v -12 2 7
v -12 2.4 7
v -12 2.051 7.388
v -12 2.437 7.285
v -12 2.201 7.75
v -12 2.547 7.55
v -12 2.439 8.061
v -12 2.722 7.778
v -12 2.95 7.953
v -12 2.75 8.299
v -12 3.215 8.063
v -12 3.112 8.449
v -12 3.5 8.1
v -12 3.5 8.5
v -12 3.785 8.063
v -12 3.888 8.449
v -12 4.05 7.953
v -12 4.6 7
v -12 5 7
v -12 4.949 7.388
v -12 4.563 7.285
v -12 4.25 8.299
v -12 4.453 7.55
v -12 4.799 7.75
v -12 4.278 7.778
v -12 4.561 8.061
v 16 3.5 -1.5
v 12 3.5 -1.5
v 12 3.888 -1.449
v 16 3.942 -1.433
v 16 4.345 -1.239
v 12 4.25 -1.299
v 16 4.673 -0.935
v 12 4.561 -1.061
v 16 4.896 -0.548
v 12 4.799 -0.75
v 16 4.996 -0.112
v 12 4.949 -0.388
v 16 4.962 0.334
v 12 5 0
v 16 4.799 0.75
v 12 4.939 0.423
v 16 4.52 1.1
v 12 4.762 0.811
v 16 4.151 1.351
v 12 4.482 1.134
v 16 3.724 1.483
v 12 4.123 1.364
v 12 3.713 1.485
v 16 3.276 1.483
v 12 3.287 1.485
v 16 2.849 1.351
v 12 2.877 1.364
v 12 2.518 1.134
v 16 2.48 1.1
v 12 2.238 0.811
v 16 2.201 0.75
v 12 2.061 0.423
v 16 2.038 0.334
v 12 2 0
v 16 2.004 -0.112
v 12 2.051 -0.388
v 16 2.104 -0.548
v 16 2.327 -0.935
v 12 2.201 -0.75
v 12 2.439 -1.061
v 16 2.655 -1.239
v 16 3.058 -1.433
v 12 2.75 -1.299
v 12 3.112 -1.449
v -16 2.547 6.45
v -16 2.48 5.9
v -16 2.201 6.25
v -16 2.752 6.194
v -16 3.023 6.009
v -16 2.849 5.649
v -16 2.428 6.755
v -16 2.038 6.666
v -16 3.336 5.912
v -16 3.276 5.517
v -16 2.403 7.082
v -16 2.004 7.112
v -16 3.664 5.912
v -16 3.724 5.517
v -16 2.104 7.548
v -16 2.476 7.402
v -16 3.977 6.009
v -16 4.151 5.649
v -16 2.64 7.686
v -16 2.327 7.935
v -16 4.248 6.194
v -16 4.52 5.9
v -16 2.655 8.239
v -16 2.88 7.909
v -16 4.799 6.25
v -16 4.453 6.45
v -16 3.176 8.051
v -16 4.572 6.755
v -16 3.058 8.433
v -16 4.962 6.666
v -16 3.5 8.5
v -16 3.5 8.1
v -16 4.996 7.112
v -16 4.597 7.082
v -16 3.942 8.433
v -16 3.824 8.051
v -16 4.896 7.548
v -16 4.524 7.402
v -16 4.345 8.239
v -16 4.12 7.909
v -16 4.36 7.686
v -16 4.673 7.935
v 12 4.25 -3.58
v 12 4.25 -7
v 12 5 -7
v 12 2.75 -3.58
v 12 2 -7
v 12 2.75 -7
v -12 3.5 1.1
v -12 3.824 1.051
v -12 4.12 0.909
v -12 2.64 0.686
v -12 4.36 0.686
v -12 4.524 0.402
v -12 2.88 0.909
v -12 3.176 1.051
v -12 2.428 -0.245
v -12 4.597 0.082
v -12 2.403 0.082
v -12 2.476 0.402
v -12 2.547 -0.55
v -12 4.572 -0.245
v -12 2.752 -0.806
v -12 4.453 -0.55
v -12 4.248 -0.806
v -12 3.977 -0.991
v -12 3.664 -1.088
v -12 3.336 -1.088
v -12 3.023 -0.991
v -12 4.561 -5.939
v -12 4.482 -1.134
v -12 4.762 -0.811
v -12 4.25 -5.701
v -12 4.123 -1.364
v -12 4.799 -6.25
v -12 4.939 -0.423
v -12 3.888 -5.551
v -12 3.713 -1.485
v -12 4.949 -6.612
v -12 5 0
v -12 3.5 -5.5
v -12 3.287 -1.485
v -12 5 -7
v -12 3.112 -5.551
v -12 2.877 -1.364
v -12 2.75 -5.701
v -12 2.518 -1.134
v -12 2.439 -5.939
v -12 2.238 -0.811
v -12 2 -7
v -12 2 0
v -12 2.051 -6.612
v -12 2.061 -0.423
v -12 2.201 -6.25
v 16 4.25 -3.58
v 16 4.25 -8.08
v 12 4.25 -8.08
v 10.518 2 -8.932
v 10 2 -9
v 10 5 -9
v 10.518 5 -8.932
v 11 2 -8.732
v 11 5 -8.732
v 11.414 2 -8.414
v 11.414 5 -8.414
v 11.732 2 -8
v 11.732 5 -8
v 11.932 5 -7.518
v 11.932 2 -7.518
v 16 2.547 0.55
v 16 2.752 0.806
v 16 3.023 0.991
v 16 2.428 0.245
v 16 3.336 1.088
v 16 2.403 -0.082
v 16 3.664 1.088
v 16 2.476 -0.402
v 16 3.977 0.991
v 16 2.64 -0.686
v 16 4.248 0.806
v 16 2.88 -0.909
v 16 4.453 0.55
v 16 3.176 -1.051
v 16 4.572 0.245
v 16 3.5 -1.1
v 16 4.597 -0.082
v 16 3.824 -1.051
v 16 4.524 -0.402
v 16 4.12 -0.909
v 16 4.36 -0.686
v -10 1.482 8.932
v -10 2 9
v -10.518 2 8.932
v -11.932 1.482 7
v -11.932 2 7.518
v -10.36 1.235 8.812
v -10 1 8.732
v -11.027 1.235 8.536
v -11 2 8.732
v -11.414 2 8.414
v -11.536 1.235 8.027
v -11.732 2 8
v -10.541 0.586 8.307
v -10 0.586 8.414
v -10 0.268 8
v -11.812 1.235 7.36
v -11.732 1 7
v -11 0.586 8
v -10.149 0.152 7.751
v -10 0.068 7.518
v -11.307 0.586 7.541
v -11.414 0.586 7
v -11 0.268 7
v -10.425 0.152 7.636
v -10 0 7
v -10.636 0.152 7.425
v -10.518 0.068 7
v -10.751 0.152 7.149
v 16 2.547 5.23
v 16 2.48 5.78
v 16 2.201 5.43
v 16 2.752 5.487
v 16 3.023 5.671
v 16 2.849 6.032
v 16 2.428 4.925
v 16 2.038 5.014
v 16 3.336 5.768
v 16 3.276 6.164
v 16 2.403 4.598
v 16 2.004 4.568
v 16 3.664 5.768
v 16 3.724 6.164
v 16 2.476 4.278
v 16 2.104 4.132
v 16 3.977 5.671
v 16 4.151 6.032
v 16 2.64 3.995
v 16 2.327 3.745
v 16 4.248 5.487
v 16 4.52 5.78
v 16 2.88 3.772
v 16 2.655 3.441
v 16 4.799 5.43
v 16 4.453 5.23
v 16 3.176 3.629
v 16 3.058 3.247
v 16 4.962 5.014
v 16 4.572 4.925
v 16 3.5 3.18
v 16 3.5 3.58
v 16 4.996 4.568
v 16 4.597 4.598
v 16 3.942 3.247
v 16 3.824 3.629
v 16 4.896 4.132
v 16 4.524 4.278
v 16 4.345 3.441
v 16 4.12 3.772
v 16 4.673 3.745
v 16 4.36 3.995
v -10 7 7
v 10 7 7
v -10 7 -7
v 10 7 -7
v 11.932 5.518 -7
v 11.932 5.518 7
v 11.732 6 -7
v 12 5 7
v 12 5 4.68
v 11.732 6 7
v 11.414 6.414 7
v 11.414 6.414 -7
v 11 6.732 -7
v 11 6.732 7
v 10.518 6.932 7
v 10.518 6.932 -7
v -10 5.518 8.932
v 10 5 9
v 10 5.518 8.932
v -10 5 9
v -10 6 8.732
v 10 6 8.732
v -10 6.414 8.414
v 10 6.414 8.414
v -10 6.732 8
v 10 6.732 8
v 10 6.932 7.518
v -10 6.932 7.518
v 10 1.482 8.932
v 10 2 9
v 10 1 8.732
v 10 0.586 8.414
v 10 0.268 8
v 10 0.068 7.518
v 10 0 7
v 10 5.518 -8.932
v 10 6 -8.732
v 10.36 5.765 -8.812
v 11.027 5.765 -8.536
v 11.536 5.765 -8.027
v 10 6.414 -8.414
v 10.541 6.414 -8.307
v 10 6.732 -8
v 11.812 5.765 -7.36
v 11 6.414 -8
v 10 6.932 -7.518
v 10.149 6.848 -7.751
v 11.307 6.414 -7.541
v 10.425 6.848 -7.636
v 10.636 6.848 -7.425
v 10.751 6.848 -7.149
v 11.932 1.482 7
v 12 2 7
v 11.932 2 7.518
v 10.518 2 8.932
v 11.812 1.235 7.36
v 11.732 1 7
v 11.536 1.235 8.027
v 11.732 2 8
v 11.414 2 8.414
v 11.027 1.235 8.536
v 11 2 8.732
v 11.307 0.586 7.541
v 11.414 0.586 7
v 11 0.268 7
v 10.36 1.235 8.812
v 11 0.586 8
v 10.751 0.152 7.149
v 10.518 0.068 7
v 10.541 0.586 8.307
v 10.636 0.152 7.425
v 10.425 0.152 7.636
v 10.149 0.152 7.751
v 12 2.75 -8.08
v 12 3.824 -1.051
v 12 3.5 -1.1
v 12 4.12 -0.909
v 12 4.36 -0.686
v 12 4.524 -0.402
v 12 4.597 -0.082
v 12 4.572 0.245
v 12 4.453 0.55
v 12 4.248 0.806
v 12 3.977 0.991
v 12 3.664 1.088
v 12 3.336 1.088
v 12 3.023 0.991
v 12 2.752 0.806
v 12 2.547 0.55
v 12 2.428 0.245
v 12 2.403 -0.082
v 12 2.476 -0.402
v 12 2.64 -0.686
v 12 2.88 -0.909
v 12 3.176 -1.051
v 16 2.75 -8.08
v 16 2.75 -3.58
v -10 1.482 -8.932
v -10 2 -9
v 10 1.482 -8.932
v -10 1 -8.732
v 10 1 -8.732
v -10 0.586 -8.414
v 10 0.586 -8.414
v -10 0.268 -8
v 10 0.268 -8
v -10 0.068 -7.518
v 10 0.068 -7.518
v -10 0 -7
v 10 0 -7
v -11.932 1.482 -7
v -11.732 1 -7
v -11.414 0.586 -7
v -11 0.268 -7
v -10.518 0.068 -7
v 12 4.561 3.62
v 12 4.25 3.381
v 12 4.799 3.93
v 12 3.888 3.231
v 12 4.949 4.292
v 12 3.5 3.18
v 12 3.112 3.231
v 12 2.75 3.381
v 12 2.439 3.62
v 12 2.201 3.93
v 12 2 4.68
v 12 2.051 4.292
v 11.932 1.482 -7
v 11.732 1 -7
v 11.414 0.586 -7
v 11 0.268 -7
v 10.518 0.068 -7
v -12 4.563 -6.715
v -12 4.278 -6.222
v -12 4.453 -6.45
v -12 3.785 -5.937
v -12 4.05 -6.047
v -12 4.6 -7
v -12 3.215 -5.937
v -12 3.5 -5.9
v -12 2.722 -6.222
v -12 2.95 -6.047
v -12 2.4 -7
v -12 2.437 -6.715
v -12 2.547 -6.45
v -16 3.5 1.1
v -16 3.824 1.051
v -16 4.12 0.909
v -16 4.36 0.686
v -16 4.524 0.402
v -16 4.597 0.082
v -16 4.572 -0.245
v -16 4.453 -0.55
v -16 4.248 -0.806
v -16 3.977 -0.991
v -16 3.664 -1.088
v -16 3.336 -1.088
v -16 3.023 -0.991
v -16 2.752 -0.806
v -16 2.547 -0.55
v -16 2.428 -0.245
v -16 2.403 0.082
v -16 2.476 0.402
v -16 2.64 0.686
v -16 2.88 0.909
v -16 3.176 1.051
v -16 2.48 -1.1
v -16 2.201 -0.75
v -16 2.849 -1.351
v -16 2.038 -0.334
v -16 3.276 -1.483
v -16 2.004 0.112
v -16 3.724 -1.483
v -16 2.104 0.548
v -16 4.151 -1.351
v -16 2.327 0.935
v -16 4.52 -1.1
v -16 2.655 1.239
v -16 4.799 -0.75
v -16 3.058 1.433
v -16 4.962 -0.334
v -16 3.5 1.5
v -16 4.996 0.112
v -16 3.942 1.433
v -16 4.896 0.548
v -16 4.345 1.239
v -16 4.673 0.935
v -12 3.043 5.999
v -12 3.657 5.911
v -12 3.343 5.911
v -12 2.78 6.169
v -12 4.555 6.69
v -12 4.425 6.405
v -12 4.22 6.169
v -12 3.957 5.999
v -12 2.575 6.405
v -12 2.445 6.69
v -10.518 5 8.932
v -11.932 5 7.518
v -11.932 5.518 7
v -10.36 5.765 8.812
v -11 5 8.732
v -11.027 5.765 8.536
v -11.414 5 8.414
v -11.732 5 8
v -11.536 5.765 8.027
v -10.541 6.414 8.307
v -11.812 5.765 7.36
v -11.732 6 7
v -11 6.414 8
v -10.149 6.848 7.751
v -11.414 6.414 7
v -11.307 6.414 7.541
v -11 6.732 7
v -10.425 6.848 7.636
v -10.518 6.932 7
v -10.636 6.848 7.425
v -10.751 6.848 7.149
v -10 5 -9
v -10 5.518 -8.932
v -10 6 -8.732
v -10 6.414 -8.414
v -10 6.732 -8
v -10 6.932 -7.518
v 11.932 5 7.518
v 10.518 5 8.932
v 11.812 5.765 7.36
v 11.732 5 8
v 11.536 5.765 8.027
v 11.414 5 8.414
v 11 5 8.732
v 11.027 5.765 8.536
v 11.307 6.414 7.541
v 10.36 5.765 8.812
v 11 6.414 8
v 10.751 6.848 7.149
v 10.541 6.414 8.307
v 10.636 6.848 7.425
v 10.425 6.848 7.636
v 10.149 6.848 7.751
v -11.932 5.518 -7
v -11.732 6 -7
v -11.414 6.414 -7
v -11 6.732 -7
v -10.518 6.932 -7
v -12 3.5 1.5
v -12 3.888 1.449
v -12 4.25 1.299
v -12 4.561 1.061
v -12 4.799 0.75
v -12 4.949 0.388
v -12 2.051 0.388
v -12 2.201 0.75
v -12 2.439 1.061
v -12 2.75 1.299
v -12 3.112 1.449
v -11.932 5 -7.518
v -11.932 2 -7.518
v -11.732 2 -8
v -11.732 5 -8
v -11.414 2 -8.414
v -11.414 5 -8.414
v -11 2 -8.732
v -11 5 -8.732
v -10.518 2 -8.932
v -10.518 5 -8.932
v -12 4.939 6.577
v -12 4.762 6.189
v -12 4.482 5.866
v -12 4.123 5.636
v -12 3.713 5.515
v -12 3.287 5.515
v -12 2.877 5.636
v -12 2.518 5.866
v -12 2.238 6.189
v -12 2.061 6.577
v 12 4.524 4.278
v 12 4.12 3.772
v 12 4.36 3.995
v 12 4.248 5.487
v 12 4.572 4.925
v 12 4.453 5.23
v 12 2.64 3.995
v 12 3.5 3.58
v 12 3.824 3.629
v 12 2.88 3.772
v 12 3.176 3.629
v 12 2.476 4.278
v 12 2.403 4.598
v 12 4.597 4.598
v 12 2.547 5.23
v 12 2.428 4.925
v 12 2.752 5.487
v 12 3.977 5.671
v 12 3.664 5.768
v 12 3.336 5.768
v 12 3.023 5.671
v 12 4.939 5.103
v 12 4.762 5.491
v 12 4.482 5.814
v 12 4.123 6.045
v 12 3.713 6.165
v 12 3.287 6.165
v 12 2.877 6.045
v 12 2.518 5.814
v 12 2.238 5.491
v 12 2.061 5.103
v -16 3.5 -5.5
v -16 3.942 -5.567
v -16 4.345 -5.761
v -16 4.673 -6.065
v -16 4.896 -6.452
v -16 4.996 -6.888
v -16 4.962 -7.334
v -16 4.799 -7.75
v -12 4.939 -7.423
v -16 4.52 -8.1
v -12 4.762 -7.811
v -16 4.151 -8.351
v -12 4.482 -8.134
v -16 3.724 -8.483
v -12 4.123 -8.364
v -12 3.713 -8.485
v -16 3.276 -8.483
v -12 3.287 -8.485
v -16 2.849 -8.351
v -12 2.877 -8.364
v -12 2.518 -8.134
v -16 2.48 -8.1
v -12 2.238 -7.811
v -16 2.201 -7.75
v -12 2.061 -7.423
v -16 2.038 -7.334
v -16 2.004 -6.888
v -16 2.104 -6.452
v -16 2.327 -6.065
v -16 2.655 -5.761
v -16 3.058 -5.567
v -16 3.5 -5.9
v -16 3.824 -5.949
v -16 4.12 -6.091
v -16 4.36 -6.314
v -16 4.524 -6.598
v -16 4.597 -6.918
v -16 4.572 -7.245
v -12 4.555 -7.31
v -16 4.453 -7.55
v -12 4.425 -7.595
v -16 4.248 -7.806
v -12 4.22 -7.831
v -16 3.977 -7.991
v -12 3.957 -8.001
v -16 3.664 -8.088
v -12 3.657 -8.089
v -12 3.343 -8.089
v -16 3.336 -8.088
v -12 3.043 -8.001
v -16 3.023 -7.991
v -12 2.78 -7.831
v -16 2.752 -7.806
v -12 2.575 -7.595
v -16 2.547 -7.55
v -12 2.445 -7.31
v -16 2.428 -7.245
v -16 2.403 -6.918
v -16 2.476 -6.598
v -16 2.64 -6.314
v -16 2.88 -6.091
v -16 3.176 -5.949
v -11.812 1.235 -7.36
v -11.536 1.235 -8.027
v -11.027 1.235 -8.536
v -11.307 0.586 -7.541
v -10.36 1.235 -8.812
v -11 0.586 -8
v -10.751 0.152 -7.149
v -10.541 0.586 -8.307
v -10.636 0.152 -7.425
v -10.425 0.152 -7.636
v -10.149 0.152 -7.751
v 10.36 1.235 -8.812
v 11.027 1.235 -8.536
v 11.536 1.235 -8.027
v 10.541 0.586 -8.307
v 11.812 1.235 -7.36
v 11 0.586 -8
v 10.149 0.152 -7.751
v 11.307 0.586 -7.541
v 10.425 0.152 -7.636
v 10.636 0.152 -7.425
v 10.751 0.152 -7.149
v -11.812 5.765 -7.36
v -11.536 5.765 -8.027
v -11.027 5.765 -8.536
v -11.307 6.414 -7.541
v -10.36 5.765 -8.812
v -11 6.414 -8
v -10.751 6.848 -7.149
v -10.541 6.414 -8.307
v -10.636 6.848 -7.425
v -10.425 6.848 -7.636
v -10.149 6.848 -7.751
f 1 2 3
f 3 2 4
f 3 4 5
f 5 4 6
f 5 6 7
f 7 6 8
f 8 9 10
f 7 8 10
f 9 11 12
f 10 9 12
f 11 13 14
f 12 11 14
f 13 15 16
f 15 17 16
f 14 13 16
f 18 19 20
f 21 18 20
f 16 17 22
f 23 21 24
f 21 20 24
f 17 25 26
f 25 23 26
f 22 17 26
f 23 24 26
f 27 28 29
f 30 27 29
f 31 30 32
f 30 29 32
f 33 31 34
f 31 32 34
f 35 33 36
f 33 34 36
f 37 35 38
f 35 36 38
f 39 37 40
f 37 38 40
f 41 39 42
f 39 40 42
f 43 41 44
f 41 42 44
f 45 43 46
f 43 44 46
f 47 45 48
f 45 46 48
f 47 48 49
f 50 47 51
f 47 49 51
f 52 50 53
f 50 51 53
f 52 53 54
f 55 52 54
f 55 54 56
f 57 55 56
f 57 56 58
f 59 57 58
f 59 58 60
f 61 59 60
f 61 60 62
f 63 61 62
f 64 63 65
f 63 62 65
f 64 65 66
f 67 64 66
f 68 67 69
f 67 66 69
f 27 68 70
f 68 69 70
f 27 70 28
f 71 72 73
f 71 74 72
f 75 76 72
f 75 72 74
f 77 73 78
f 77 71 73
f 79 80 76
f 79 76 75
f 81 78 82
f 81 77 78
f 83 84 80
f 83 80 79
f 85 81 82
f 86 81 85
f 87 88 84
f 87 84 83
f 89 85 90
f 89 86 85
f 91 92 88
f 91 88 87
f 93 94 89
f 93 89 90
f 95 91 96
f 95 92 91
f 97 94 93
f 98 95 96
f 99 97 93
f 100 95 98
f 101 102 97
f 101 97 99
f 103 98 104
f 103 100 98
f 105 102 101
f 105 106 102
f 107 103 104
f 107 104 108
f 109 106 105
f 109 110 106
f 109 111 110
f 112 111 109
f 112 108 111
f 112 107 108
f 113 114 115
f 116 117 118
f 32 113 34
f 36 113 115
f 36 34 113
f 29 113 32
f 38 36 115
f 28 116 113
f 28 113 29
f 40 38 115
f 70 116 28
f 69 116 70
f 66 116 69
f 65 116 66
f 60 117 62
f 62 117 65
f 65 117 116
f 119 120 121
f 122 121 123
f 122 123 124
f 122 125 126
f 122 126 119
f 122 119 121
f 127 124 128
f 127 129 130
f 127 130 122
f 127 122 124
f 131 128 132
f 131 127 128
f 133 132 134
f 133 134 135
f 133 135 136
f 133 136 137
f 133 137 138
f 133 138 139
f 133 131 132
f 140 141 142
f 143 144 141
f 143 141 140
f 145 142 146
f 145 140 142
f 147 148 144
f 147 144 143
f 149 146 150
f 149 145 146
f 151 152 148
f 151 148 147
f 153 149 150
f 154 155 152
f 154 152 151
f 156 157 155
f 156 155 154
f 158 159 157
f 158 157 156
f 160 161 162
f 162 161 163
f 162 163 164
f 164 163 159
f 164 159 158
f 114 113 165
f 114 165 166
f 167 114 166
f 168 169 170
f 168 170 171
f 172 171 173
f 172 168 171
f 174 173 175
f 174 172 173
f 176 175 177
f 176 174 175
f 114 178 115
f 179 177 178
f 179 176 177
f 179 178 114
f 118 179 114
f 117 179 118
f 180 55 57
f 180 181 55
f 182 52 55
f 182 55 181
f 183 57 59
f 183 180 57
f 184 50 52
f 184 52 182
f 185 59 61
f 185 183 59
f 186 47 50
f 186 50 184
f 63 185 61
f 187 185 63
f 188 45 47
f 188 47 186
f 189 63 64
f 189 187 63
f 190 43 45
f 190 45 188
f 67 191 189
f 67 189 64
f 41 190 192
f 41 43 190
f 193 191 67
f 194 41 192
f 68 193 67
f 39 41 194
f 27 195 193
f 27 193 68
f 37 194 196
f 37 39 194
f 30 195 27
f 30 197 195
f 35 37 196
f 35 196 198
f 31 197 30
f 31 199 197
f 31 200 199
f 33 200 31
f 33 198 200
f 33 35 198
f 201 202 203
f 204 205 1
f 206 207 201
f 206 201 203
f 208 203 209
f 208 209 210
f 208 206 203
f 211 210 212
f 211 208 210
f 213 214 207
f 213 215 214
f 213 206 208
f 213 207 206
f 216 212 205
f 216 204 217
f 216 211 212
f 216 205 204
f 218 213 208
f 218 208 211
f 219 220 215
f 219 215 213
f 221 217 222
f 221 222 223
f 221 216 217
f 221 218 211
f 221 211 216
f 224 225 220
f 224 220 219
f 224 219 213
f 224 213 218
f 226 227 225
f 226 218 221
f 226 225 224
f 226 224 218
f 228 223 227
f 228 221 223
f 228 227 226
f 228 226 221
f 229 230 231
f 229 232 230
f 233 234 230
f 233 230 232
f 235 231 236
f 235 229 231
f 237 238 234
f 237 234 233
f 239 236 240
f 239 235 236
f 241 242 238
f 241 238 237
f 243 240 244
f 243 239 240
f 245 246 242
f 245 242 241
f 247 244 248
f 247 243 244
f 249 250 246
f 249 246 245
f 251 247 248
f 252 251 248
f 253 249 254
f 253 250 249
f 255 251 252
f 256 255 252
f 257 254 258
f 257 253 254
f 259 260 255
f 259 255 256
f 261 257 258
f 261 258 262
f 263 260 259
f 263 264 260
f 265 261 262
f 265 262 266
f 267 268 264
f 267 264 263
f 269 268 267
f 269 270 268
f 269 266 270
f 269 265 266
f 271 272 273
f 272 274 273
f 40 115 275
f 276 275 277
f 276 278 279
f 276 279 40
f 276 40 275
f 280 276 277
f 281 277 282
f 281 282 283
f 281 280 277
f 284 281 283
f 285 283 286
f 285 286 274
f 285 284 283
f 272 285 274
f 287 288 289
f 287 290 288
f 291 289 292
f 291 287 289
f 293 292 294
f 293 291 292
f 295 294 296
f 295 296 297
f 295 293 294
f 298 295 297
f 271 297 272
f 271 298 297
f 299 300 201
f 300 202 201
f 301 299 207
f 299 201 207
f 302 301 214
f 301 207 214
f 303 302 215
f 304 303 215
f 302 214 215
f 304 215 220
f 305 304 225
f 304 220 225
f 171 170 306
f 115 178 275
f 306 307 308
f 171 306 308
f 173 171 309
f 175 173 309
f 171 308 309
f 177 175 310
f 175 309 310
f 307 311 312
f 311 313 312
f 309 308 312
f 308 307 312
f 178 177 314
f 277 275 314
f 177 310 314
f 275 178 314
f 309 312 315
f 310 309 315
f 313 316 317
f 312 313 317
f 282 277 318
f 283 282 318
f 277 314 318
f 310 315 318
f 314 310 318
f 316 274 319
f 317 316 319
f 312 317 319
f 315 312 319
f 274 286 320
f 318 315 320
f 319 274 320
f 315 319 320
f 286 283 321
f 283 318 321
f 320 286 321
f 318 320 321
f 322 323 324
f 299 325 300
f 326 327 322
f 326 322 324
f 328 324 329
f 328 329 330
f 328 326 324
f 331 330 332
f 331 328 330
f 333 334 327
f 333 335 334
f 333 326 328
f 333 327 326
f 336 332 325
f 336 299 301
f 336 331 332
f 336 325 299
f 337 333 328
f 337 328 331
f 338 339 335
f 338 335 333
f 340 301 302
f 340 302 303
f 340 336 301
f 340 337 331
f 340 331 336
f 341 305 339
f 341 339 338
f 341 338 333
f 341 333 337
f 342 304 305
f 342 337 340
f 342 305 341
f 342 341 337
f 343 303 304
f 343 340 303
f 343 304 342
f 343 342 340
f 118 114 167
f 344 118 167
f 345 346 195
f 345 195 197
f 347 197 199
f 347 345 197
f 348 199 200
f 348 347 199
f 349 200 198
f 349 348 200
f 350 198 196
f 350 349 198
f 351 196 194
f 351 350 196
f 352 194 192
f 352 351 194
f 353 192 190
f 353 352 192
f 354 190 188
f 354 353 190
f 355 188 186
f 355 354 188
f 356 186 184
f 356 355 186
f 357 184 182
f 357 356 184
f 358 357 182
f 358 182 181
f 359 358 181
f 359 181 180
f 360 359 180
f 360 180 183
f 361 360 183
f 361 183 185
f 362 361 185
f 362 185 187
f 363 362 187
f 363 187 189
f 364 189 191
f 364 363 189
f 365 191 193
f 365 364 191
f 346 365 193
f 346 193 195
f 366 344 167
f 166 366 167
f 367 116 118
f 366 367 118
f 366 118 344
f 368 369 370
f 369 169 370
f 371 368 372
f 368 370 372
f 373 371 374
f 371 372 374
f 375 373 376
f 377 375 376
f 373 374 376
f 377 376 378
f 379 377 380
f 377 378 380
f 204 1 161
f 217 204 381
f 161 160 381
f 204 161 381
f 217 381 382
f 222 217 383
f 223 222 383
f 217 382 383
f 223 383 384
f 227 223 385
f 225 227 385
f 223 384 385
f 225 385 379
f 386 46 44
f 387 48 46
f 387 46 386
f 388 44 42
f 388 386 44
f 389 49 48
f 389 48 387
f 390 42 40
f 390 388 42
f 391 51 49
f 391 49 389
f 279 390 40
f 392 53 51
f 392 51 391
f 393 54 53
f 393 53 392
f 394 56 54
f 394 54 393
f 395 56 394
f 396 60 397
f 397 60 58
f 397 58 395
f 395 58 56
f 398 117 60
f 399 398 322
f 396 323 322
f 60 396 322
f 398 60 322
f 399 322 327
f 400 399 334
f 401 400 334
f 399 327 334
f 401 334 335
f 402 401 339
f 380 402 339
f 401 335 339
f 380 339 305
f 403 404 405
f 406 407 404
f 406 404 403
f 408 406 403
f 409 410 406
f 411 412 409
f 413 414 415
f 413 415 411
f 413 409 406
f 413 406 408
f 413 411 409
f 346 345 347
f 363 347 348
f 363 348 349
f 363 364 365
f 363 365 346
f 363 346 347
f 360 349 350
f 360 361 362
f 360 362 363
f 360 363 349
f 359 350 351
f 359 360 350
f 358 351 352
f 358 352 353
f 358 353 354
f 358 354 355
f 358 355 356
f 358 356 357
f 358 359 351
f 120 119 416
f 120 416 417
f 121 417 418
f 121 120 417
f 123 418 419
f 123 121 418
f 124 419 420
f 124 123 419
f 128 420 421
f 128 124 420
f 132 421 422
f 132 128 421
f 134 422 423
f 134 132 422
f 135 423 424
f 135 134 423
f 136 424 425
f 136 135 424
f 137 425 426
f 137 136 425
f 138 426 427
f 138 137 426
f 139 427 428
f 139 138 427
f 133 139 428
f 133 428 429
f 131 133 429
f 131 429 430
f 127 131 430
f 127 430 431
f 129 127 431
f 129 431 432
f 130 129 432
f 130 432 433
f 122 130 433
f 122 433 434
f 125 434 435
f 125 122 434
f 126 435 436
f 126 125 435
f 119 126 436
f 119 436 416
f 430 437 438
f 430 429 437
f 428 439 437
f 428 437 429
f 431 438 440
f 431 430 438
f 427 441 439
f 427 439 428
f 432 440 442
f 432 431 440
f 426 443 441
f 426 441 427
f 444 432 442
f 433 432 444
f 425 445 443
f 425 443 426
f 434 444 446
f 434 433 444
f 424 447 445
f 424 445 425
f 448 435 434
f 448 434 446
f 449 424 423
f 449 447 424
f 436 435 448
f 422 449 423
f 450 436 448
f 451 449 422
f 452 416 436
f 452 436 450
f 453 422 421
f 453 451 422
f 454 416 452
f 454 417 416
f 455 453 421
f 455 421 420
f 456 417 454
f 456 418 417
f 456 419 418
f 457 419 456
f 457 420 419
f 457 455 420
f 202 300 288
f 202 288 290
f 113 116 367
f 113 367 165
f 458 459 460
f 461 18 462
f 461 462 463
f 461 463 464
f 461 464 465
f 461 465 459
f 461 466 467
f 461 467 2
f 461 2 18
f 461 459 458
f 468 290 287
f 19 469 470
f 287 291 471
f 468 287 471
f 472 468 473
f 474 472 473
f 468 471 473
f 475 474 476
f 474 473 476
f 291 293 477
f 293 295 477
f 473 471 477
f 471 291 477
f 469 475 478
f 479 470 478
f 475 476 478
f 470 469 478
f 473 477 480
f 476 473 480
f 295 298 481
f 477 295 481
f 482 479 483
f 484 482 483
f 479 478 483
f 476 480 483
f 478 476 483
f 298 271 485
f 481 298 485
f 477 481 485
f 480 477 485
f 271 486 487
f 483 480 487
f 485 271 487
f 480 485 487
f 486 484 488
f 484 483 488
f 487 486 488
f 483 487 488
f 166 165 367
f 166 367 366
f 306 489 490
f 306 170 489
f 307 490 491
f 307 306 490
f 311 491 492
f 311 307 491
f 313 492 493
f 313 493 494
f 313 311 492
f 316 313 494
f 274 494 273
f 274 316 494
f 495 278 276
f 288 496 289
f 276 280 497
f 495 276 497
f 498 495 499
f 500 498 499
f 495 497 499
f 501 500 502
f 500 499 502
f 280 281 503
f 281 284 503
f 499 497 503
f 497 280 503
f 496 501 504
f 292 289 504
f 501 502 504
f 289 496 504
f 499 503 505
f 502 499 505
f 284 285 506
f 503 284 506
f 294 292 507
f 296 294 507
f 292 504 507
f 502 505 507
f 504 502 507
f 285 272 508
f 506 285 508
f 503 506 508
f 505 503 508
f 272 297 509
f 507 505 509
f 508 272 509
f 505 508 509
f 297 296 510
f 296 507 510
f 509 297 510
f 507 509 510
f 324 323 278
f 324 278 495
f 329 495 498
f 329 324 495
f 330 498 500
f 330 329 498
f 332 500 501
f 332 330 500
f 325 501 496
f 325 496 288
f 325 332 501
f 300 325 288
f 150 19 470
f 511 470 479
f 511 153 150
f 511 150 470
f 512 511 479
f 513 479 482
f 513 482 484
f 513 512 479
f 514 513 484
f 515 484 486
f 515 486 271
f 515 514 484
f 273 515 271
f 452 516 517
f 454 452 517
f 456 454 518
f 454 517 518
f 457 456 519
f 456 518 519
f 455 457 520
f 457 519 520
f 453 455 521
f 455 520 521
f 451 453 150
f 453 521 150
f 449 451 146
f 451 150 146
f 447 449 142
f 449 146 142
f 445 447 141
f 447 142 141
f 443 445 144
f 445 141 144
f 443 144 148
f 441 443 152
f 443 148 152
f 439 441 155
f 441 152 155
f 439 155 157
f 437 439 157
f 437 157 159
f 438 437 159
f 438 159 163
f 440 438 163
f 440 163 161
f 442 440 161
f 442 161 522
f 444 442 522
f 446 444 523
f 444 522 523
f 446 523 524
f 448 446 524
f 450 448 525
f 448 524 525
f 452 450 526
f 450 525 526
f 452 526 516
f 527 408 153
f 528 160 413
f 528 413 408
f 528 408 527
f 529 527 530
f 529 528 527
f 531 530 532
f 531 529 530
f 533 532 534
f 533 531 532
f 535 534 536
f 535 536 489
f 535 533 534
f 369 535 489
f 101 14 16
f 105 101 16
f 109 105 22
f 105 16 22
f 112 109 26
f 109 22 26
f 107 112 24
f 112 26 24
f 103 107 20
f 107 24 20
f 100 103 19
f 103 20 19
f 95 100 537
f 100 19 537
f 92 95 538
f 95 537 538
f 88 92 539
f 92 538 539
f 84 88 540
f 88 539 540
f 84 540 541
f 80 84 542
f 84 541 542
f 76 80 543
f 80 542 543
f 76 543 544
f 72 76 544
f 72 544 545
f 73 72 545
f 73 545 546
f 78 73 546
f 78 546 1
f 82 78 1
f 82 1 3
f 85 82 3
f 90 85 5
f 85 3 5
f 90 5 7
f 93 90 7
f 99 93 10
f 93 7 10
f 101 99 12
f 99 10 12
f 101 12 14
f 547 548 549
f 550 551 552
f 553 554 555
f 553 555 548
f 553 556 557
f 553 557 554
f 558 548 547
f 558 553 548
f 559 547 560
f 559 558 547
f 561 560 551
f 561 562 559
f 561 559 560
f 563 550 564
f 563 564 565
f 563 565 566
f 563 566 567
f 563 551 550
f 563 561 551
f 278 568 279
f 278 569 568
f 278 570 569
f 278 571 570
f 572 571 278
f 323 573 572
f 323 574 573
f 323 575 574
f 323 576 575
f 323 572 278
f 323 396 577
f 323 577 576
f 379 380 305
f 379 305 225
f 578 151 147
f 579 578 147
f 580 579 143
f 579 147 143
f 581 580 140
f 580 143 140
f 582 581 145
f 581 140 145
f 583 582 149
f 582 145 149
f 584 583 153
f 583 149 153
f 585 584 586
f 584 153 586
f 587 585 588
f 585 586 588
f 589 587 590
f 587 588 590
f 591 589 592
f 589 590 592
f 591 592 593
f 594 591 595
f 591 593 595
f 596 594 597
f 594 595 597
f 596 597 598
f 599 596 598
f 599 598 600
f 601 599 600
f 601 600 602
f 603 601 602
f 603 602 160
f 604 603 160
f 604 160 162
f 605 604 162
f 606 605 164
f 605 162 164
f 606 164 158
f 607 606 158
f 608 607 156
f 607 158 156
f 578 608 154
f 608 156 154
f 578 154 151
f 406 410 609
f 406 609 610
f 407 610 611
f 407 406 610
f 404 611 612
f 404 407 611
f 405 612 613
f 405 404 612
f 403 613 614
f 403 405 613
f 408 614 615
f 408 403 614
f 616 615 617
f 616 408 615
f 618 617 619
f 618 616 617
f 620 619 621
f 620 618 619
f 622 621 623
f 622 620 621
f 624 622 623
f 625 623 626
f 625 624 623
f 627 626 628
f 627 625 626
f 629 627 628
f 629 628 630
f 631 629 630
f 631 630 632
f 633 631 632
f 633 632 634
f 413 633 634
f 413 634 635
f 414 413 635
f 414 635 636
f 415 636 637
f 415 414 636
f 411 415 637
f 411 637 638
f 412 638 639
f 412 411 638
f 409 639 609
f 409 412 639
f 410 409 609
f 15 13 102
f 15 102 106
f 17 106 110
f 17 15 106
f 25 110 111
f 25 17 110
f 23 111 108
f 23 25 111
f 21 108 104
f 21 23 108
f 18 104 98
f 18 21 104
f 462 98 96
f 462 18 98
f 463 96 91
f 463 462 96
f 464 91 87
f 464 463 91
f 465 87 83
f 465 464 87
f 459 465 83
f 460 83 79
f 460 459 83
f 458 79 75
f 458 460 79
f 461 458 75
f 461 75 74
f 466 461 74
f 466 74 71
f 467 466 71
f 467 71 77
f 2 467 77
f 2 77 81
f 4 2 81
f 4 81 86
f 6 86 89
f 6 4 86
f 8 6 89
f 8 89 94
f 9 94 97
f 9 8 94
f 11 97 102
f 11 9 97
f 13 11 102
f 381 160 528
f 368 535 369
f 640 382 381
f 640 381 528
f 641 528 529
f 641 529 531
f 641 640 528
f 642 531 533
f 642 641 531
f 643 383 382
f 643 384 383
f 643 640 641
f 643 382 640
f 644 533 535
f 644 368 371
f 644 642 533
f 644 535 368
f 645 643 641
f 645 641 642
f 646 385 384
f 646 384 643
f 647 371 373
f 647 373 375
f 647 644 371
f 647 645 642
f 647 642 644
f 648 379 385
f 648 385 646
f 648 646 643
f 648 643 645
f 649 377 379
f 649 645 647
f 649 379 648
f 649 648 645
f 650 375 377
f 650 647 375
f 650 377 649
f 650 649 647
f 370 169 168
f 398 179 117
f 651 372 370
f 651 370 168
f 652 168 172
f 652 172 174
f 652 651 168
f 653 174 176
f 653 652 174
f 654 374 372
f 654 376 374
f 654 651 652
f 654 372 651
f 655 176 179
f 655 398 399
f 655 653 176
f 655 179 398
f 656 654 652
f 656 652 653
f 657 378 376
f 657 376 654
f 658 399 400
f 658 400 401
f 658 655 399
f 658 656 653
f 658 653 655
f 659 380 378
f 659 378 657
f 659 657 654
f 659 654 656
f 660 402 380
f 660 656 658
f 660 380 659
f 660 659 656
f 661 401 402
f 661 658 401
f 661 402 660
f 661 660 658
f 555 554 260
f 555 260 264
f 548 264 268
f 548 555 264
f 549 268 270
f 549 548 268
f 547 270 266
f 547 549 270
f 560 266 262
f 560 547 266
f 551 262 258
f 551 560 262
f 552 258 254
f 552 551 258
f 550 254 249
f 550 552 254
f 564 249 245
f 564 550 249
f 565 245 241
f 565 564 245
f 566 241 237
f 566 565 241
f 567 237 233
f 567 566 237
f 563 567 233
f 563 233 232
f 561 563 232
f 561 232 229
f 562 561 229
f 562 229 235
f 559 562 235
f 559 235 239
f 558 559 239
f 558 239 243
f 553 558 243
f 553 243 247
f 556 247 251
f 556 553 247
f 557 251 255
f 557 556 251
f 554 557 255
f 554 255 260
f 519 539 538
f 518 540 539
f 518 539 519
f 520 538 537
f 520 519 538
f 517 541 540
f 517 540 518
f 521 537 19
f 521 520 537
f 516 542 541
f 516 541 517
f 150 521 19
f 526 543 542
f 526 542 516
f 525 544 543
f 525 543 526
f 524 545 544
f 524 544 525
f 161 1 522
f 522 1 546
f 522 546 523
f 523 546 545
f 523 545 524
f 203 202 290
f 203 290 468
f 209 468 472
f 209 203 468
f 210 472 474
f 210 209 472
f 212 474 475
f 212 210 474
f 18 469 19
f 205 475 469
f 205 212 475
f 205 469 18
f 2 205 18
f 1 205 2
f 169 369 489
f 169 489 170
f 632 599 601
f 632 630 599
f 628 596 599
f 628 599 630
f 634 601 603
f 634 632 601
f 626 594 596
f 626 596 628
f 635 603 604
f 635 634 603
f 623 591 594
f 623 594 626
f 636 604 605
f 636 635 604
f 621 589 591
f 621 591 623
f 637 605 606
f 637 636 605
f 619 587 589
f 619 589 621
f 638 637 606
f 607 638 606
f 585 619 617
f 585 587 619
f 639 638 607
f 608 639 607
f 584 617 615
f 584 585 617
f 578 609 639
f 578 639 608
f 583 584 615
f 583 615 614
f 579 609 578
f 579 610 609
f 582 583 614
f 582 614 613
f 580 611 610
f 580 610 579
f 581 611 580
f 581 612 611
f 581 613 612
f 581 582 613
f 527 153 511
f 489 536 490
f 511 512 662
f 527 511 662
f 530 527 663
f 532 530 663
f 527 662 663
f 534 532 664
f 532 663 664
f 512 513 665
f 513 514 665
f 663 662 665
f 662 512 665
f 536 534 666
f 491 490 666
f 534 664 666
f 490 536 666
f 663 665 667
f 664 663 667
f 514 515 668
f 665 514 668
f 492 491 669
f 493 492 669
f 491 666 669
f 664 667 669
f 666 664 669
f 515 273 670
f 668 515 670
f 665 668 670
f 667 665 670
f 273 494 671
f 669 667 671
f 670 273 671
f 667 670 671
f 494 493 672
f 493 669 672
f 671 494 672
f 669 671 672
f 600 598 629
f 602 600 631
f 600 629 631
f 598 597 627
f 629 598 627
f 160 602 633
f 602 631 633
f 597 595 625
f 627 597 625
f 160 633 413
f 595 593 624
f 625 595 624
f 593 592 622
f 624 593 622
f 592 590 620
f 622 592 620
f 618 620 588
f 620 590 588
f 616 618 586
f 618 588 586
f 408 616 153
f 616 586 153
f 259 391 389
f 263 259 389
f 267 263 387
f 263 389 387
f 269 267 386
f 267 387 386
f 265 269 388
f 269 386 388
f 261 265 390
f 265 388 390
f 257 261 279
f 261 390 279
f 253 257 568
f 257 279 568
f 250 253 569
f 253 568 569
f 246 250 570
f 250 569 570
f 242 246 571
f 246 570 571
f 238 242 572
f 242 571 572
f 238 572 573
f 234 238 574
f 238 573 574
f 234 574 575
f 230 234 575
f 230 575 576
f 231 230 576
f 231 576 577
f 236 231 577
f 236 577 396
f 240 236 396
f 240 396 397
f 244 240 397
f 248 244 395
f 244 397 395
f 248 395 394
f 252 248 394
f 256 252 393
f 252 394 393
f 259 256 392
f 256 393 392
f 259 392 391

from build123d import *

# Parameters (mm, degrees)
BOSS_EXTRUDE1_DEPTH = 7
FILLET1_R           = 2
SKETCH3_R           = 1.5
SKETCH3_R_2         = 1.1
BOSS_EXTRUDE2_DEPTH = 4
SKETCH4_R           = 1.5
SKETCH4_R_2         = 1.1
SKETCH4_W           = 4.5
SKETCH4_H           = 1.5
BOSS_EXTRUDE3_DEPTH = 4


with BuildPart() as part:
    # Sketch1 → Boss-Extrude1 (new body)
    with BuildSketch(Plane(origin=(0, 0, 0), x_dir=(1, 0, 0), z_dir=(0, 1, 0))):
        with BuildLine():
            Line((10, -9), (-10, -9))
            ThreePointArc((-10, -9), (-11.414213562, -8.414213562), (-12, -7))
            Line((-12, -7), (-12, 7))
            ThreePointArc((-12, 7), (-11.414213562, 8.414213562), (-10, 9))
            Line((-10, 9), (10, 9))
            ThreePointArc((10, 9), (11.414213562, 8.414213562), (12, 7))
            Line((12, 7), (12, -7))
            ThreePointArc((12, -7), (11.414213562, -8.414213562), (10, -9))
        make_face()
    extrude(amount=BOSS_EXTRUDE1_DEPTH)

    # Fillet1
    fillet1_edges = [part.edges().sort_by_distance(p)[0] for p in [
        (12, 0, 0),
        (11.414213562, 0, 8.414213562),
        (0, 0, 9),
        (-11.414213562, 0, 8.414213562),
        (11.414213562, 7, 8.414213562),
        (12, 7, 0),
        (11.414213562, 7, -8.414213562),
        (0, 7, -9),
        (-11.414213562, 7, -8.414213562),
        (-12, 7, 0),
        (-11.414213562, 7, 8.414213562),
        (-12, 0, 0),
        (0, 7, 9),
        (-11.414213562, 0, -8.414213562),
        (0, 0, -9),
        (11.414213562, 0, -8.414213562),
    ]]
    fillet(fillet1_edges, radius=FILLET1_R)

    # Sketch3 → Boss-Extrude2 (add)
    with BuildSketch(Plane.ZY.offset(12)):
        with Locations((7, 3.5)):
            Circle(SKETCH3_R)
        with Locations((7, 3.5)):
            Circle(SKETCH3_R_2, mode=Mode.SUBTRACT)
        with Locations((0, 3.5)):
            Circle(SKETCH3_R)
        with Locations((0, 3.5)):
            Circle(SKETCH3_R_2, mode=Mode.SUBTRACT)
        with Locations((-7, 3.5)):
            Circle(SKETCH3_R)
        with Locations((-7, 3.5)):
            Circle(SKETCH3_R_2, mode=Mode.SUBTRACT)
    extrude(amount=BOSS_EXTRUDE2_DEPTH)

    # Sketch4 → Boss-Extrude3 (add)
    with BuildSketch(Plane(origin=(12, 0, 0), x_dir=(0, 0, -1), z_dir=(1, 0, 0))):
        with Locations((-4.680368176, 3.5)):
            Circle(SKETCH4_R)
        with Locations((-4.680368176, 3.5)):
            Circle(SKETCH4_R_2, mode=Mode.SUBTRACT)
        with Locations((0, 3.5)):
            Circle(SKETCH4_R)
        with Locations((0, 3.5)):
            Circle(SKETCH4_R_2, mode=Mode.SUBTRACT)
        with Locations((5.830286219, 3.5)):
            Rectangle(SKETCH4_W, SKETCH4_H)
    extrude(amount=BOSS_EXTRUDE3_DEPTH)


solid = part.part
